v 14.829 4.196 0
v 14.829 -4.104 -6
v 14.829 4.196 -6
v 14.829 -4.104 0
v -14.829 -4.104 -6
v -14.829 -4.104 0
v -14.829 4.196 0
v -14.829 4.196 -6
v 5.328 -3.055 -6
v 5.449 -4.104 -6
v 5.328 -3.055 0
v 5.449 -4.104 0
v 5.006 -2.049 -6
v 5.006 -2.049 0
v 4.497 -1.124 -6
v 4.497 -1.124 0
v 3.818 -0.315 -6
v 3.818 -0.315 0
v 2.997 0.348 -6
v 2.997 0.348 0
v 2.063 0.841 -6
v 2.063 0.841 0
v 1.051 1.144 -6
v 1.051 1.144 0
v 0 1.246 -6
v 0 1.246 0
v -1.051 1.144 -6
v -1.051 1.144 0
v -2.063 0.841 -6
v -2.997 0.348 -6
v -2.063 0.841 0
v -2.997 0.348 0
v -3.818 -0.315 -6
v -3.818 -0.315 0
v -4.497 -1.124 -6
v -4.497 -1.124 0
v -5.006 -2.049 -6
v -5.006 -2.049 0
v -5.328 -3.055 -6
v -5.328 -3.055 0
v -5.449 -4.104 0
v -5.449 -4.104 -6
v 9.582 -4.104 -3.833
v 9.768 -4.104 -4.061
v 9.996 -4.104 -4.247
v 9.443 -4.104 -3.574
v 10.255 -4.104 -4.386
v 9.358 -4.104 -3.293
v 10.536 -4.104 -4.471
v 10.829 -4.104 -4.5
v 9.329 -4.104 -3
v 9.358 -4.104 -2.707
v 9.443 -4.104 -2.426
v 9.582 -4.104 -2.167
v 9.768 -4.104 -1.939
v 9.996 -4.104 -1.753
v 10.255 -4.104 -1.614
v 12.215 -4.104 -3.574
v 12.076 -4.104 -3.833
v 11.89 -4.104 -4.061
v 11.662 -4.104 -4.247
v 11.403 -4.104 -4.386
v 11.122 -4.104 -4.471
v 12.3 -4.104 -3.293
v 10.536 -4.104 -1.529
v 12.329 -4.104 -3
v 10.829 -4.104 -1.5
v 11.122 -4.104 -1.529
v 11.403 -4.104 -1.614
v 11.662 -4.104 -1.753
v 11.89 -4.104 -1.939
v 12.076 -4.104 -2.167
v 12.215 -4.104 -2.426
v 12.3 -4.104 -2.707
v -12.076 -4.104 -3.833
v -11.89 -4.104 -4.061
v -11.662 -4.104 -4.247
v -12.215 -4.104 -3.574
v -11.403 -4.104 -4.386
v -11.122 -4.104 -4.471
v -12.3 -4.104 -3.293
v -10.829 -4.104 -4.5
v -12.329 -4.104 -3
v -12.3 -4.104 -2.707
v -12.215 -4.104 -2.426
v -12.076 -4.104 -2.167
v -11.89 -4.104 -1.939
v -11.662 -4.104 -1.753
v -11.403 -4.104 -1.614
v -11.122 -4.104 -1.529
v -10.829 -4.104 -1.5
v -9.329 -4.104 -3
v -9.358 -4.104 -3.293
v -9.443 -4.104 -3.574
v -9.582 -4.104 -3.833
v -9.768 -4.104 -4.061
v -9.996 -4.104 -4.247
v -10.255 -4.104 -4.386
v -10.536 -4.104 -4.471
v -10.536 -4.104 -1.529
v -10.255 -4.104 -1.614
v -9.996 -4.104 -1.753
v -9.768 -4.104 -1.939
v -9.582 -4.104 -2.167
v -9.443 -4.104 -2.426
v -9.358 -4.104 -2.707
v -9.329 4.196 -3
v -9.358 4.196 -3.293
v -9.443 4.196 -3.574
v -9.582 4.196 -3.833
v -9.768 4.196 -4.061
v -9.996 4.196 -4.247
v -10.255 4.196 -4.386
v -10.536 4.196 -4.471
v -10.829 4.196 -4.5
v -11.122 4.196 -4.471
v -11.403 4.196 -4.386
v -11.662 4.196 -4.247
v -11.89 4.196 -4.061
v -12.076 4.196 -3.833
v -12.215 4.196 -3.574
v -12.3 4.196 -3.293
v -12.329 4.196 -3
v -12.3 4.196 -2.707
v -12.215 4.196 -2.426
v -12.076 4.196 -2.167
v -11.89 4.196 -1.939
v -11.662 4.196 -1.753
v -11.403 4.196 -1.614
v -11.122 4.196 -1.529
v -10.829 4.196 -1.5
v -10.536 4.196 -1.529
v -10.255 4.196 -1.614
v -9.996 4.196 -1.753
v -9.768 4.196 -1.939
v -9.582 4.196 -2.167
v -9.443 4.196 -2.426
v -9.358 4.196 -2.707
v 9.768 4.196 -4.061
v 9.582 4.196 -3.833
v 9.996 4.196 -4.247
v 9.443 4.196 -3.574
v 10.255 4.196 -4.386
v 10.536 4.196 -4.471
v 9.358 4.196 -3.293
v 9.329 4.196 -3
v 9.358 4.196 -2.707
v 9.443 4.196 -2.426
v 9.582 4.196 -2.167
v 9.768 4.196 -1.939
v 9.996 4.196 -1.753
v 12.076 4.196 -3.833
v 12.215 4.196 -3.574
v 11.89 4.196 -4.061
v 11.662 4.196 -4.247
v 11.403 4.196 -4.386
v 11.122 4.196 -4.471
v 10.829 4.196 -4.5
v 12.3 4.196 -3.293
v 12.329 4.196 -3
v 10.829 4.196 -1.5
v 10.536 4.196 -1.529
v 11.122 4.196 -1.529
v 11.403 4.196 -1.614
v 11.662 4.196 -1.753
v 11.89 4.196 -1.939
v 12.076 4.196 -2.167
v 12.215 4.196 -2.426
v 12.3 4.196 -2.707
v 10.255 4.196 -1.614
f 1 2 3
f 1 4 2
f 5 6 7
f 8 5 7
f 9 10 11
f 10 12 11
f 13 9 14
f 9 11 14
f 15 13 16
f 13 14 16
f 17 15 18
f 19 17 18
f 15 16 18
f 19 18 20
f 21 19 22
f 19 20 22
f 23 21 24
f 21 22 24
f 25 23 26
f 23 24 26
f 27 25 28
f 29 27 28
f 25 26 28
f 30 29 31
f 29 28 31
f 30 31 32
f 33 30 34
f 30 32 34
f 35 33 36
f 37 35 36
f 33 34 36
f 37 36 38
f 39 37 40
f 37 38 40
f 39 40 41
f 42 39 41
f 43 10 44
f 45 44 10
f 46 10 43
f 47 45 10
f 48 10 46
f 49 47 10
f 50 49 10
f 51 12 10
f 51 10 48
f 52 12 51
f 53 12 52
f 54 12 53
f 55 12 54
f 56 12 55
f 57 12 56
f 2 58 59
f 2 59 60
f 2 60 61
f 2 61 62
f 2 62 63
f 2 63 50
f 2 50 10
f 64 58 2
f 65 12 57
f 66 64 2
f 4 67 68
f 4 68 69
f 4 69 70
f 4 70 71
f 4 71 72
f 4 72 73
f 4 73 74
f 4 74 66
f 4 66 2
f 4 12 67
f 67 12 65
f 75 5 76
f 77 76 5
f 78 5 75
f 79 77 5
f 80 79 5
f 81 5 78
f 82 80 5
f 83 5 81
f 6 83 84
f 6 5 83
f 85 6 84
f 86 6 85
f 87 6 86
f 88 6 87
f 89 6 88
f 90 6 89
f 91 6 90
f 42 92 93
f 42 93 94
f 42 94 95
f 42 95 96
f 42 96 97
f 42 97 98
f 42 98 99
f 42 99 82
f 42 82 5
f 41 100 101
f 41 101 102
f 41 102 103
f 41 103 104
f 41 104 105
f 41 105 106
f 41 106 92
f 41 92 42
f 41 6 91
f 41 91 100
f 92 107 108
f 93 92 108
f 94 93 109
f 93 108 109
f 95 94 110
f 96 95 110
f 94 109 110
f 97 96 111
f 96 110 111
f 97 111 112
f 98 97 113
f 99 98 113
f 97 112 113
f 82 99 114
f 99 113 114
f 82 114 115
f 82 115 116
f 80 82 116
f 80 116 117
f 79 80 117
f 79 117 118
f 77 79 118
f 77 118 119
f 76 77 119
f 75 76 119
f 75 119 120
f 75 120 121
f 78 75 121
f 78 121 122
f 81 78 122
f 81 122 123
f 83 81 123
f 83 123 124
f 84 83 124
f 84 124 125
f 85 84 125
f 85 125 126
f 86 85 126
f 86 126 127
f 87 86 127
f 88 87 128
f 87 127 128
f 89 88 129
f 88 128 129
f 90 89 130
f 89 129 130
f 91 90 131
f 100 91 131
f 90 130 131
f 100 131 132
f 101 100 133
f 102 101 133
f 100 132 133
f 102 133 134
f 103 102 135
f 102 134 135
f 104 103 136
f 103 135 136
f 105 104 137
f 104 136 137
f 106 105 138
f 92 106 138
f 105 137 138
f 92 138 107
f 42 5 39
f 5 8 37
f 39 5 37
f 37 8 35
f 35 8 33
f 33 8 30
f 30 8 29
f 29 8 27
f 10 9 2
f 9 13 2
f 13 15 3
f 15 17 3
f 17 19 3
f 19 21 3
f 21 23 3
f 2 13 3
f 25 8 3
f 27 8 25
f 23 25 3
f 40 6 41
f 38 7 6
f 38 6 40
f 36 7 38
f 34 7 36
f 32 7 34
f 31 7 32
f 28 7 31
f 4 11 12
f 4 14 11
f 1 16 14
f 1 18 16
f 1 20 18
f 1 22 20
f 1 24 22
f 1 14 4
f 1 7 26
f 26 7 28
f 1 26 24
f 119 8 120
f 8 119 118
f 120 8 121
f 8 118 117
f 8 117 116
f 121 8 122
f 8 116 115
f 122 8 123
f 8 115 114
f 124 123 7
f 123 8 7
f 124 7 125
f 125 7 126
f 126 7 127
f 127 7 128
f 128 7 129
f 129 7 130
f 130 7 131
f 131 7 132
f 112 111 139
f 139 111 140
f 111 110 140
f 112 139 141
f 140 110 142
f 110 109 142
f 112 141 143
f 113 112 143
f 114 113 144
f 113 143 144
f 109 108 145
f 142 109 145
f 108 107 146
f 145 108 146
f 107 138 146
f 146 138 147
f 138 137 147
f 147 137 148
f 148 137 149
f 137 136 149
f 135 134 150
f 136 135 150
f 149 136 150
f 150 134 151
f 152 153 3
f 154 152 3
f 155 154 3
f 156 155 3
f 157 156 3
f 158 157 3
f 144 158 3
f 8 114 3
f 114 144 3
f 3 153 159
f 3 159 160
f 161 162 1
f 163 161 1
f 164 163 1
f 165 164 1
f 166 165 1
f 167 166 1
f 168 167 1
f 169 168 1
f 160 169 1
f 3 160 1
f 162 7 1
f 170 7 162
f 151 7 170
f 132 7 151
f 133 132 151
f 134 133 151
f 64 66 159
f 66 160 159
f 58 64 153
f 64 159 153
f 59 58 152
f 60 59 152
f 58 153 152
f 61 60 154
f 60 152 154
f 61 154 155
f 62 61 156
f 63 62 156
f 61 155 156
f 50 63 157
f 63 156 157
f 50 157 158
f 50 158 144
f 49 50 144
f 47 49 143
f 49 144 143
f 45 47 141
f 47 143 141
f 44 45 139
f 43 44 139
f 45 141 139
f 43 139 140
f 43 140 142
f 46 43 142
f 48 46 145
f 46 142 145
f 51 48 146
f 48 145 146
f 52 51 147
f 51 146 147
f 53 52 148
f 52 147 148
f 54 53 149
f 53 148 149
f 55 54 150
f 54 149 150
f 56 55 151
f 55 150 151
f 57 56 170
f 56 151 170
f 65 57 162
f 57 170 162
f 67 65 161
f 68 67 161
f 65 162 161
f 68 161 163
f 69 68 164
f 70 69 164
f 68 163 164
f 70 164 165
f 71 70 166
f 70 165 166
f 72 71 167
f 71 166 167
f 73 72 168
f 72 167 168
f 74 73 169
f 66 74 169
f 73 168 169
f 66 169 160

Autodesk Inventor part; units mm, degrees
ref_plane "YZ Plane" through (0, 0, 0) normal (1, 0, 0) x (0, 1, 0)
ref_plane "XZ Plane" through (0, 0, 0) normal (0, 1, 0) x (-1, 0, 0)
sketch "Sketch1" plane through (0, 0, 0) normal (0, 0, 1) x (1, 0, 0)
  line L0 (-14.8291, -4.1038) -> (-14.8291, 4.1962)
  line L1 (-14.8291, -4.1038) -> (-5.4491, -4.1038)
  arc A0 (5.4491, -4.1038) -> (-5.4491, -4.1038) centre (0, -4.2038) ccw
  line L2 (5.4491, -4.1038) -> (14.8291, -4.1038)
  line L3 (14.8291, -4.1038) -> (14.8291, 4.1962)
  line L4 (-14.8291, 4.1962) -> (14.8291, 4.1962)
ref_plane "Work Plane1" through (-18.034, -15.556, -6) normal (0, 0, -1) x (0, 1, 0)
extrude "Extrusion1" add sketch "Sketch1" against normal up to surface (6 mm away)
sketch "Sketch2" plane through (-14.8291, 4.1962, 0) normal (0, 1, 0) x (1, 0, 0)
  circle A0 centre (4, 3) radius 1.5 projected
  circle A1 centre (25.6582, 3) radius 1.5 projected
  point P0 (14.8291, 0)
extrude "Extrusion2" cut sketch "Sketch2" against normal through all
properties part number "pylon_actuator_holder_jaw"
